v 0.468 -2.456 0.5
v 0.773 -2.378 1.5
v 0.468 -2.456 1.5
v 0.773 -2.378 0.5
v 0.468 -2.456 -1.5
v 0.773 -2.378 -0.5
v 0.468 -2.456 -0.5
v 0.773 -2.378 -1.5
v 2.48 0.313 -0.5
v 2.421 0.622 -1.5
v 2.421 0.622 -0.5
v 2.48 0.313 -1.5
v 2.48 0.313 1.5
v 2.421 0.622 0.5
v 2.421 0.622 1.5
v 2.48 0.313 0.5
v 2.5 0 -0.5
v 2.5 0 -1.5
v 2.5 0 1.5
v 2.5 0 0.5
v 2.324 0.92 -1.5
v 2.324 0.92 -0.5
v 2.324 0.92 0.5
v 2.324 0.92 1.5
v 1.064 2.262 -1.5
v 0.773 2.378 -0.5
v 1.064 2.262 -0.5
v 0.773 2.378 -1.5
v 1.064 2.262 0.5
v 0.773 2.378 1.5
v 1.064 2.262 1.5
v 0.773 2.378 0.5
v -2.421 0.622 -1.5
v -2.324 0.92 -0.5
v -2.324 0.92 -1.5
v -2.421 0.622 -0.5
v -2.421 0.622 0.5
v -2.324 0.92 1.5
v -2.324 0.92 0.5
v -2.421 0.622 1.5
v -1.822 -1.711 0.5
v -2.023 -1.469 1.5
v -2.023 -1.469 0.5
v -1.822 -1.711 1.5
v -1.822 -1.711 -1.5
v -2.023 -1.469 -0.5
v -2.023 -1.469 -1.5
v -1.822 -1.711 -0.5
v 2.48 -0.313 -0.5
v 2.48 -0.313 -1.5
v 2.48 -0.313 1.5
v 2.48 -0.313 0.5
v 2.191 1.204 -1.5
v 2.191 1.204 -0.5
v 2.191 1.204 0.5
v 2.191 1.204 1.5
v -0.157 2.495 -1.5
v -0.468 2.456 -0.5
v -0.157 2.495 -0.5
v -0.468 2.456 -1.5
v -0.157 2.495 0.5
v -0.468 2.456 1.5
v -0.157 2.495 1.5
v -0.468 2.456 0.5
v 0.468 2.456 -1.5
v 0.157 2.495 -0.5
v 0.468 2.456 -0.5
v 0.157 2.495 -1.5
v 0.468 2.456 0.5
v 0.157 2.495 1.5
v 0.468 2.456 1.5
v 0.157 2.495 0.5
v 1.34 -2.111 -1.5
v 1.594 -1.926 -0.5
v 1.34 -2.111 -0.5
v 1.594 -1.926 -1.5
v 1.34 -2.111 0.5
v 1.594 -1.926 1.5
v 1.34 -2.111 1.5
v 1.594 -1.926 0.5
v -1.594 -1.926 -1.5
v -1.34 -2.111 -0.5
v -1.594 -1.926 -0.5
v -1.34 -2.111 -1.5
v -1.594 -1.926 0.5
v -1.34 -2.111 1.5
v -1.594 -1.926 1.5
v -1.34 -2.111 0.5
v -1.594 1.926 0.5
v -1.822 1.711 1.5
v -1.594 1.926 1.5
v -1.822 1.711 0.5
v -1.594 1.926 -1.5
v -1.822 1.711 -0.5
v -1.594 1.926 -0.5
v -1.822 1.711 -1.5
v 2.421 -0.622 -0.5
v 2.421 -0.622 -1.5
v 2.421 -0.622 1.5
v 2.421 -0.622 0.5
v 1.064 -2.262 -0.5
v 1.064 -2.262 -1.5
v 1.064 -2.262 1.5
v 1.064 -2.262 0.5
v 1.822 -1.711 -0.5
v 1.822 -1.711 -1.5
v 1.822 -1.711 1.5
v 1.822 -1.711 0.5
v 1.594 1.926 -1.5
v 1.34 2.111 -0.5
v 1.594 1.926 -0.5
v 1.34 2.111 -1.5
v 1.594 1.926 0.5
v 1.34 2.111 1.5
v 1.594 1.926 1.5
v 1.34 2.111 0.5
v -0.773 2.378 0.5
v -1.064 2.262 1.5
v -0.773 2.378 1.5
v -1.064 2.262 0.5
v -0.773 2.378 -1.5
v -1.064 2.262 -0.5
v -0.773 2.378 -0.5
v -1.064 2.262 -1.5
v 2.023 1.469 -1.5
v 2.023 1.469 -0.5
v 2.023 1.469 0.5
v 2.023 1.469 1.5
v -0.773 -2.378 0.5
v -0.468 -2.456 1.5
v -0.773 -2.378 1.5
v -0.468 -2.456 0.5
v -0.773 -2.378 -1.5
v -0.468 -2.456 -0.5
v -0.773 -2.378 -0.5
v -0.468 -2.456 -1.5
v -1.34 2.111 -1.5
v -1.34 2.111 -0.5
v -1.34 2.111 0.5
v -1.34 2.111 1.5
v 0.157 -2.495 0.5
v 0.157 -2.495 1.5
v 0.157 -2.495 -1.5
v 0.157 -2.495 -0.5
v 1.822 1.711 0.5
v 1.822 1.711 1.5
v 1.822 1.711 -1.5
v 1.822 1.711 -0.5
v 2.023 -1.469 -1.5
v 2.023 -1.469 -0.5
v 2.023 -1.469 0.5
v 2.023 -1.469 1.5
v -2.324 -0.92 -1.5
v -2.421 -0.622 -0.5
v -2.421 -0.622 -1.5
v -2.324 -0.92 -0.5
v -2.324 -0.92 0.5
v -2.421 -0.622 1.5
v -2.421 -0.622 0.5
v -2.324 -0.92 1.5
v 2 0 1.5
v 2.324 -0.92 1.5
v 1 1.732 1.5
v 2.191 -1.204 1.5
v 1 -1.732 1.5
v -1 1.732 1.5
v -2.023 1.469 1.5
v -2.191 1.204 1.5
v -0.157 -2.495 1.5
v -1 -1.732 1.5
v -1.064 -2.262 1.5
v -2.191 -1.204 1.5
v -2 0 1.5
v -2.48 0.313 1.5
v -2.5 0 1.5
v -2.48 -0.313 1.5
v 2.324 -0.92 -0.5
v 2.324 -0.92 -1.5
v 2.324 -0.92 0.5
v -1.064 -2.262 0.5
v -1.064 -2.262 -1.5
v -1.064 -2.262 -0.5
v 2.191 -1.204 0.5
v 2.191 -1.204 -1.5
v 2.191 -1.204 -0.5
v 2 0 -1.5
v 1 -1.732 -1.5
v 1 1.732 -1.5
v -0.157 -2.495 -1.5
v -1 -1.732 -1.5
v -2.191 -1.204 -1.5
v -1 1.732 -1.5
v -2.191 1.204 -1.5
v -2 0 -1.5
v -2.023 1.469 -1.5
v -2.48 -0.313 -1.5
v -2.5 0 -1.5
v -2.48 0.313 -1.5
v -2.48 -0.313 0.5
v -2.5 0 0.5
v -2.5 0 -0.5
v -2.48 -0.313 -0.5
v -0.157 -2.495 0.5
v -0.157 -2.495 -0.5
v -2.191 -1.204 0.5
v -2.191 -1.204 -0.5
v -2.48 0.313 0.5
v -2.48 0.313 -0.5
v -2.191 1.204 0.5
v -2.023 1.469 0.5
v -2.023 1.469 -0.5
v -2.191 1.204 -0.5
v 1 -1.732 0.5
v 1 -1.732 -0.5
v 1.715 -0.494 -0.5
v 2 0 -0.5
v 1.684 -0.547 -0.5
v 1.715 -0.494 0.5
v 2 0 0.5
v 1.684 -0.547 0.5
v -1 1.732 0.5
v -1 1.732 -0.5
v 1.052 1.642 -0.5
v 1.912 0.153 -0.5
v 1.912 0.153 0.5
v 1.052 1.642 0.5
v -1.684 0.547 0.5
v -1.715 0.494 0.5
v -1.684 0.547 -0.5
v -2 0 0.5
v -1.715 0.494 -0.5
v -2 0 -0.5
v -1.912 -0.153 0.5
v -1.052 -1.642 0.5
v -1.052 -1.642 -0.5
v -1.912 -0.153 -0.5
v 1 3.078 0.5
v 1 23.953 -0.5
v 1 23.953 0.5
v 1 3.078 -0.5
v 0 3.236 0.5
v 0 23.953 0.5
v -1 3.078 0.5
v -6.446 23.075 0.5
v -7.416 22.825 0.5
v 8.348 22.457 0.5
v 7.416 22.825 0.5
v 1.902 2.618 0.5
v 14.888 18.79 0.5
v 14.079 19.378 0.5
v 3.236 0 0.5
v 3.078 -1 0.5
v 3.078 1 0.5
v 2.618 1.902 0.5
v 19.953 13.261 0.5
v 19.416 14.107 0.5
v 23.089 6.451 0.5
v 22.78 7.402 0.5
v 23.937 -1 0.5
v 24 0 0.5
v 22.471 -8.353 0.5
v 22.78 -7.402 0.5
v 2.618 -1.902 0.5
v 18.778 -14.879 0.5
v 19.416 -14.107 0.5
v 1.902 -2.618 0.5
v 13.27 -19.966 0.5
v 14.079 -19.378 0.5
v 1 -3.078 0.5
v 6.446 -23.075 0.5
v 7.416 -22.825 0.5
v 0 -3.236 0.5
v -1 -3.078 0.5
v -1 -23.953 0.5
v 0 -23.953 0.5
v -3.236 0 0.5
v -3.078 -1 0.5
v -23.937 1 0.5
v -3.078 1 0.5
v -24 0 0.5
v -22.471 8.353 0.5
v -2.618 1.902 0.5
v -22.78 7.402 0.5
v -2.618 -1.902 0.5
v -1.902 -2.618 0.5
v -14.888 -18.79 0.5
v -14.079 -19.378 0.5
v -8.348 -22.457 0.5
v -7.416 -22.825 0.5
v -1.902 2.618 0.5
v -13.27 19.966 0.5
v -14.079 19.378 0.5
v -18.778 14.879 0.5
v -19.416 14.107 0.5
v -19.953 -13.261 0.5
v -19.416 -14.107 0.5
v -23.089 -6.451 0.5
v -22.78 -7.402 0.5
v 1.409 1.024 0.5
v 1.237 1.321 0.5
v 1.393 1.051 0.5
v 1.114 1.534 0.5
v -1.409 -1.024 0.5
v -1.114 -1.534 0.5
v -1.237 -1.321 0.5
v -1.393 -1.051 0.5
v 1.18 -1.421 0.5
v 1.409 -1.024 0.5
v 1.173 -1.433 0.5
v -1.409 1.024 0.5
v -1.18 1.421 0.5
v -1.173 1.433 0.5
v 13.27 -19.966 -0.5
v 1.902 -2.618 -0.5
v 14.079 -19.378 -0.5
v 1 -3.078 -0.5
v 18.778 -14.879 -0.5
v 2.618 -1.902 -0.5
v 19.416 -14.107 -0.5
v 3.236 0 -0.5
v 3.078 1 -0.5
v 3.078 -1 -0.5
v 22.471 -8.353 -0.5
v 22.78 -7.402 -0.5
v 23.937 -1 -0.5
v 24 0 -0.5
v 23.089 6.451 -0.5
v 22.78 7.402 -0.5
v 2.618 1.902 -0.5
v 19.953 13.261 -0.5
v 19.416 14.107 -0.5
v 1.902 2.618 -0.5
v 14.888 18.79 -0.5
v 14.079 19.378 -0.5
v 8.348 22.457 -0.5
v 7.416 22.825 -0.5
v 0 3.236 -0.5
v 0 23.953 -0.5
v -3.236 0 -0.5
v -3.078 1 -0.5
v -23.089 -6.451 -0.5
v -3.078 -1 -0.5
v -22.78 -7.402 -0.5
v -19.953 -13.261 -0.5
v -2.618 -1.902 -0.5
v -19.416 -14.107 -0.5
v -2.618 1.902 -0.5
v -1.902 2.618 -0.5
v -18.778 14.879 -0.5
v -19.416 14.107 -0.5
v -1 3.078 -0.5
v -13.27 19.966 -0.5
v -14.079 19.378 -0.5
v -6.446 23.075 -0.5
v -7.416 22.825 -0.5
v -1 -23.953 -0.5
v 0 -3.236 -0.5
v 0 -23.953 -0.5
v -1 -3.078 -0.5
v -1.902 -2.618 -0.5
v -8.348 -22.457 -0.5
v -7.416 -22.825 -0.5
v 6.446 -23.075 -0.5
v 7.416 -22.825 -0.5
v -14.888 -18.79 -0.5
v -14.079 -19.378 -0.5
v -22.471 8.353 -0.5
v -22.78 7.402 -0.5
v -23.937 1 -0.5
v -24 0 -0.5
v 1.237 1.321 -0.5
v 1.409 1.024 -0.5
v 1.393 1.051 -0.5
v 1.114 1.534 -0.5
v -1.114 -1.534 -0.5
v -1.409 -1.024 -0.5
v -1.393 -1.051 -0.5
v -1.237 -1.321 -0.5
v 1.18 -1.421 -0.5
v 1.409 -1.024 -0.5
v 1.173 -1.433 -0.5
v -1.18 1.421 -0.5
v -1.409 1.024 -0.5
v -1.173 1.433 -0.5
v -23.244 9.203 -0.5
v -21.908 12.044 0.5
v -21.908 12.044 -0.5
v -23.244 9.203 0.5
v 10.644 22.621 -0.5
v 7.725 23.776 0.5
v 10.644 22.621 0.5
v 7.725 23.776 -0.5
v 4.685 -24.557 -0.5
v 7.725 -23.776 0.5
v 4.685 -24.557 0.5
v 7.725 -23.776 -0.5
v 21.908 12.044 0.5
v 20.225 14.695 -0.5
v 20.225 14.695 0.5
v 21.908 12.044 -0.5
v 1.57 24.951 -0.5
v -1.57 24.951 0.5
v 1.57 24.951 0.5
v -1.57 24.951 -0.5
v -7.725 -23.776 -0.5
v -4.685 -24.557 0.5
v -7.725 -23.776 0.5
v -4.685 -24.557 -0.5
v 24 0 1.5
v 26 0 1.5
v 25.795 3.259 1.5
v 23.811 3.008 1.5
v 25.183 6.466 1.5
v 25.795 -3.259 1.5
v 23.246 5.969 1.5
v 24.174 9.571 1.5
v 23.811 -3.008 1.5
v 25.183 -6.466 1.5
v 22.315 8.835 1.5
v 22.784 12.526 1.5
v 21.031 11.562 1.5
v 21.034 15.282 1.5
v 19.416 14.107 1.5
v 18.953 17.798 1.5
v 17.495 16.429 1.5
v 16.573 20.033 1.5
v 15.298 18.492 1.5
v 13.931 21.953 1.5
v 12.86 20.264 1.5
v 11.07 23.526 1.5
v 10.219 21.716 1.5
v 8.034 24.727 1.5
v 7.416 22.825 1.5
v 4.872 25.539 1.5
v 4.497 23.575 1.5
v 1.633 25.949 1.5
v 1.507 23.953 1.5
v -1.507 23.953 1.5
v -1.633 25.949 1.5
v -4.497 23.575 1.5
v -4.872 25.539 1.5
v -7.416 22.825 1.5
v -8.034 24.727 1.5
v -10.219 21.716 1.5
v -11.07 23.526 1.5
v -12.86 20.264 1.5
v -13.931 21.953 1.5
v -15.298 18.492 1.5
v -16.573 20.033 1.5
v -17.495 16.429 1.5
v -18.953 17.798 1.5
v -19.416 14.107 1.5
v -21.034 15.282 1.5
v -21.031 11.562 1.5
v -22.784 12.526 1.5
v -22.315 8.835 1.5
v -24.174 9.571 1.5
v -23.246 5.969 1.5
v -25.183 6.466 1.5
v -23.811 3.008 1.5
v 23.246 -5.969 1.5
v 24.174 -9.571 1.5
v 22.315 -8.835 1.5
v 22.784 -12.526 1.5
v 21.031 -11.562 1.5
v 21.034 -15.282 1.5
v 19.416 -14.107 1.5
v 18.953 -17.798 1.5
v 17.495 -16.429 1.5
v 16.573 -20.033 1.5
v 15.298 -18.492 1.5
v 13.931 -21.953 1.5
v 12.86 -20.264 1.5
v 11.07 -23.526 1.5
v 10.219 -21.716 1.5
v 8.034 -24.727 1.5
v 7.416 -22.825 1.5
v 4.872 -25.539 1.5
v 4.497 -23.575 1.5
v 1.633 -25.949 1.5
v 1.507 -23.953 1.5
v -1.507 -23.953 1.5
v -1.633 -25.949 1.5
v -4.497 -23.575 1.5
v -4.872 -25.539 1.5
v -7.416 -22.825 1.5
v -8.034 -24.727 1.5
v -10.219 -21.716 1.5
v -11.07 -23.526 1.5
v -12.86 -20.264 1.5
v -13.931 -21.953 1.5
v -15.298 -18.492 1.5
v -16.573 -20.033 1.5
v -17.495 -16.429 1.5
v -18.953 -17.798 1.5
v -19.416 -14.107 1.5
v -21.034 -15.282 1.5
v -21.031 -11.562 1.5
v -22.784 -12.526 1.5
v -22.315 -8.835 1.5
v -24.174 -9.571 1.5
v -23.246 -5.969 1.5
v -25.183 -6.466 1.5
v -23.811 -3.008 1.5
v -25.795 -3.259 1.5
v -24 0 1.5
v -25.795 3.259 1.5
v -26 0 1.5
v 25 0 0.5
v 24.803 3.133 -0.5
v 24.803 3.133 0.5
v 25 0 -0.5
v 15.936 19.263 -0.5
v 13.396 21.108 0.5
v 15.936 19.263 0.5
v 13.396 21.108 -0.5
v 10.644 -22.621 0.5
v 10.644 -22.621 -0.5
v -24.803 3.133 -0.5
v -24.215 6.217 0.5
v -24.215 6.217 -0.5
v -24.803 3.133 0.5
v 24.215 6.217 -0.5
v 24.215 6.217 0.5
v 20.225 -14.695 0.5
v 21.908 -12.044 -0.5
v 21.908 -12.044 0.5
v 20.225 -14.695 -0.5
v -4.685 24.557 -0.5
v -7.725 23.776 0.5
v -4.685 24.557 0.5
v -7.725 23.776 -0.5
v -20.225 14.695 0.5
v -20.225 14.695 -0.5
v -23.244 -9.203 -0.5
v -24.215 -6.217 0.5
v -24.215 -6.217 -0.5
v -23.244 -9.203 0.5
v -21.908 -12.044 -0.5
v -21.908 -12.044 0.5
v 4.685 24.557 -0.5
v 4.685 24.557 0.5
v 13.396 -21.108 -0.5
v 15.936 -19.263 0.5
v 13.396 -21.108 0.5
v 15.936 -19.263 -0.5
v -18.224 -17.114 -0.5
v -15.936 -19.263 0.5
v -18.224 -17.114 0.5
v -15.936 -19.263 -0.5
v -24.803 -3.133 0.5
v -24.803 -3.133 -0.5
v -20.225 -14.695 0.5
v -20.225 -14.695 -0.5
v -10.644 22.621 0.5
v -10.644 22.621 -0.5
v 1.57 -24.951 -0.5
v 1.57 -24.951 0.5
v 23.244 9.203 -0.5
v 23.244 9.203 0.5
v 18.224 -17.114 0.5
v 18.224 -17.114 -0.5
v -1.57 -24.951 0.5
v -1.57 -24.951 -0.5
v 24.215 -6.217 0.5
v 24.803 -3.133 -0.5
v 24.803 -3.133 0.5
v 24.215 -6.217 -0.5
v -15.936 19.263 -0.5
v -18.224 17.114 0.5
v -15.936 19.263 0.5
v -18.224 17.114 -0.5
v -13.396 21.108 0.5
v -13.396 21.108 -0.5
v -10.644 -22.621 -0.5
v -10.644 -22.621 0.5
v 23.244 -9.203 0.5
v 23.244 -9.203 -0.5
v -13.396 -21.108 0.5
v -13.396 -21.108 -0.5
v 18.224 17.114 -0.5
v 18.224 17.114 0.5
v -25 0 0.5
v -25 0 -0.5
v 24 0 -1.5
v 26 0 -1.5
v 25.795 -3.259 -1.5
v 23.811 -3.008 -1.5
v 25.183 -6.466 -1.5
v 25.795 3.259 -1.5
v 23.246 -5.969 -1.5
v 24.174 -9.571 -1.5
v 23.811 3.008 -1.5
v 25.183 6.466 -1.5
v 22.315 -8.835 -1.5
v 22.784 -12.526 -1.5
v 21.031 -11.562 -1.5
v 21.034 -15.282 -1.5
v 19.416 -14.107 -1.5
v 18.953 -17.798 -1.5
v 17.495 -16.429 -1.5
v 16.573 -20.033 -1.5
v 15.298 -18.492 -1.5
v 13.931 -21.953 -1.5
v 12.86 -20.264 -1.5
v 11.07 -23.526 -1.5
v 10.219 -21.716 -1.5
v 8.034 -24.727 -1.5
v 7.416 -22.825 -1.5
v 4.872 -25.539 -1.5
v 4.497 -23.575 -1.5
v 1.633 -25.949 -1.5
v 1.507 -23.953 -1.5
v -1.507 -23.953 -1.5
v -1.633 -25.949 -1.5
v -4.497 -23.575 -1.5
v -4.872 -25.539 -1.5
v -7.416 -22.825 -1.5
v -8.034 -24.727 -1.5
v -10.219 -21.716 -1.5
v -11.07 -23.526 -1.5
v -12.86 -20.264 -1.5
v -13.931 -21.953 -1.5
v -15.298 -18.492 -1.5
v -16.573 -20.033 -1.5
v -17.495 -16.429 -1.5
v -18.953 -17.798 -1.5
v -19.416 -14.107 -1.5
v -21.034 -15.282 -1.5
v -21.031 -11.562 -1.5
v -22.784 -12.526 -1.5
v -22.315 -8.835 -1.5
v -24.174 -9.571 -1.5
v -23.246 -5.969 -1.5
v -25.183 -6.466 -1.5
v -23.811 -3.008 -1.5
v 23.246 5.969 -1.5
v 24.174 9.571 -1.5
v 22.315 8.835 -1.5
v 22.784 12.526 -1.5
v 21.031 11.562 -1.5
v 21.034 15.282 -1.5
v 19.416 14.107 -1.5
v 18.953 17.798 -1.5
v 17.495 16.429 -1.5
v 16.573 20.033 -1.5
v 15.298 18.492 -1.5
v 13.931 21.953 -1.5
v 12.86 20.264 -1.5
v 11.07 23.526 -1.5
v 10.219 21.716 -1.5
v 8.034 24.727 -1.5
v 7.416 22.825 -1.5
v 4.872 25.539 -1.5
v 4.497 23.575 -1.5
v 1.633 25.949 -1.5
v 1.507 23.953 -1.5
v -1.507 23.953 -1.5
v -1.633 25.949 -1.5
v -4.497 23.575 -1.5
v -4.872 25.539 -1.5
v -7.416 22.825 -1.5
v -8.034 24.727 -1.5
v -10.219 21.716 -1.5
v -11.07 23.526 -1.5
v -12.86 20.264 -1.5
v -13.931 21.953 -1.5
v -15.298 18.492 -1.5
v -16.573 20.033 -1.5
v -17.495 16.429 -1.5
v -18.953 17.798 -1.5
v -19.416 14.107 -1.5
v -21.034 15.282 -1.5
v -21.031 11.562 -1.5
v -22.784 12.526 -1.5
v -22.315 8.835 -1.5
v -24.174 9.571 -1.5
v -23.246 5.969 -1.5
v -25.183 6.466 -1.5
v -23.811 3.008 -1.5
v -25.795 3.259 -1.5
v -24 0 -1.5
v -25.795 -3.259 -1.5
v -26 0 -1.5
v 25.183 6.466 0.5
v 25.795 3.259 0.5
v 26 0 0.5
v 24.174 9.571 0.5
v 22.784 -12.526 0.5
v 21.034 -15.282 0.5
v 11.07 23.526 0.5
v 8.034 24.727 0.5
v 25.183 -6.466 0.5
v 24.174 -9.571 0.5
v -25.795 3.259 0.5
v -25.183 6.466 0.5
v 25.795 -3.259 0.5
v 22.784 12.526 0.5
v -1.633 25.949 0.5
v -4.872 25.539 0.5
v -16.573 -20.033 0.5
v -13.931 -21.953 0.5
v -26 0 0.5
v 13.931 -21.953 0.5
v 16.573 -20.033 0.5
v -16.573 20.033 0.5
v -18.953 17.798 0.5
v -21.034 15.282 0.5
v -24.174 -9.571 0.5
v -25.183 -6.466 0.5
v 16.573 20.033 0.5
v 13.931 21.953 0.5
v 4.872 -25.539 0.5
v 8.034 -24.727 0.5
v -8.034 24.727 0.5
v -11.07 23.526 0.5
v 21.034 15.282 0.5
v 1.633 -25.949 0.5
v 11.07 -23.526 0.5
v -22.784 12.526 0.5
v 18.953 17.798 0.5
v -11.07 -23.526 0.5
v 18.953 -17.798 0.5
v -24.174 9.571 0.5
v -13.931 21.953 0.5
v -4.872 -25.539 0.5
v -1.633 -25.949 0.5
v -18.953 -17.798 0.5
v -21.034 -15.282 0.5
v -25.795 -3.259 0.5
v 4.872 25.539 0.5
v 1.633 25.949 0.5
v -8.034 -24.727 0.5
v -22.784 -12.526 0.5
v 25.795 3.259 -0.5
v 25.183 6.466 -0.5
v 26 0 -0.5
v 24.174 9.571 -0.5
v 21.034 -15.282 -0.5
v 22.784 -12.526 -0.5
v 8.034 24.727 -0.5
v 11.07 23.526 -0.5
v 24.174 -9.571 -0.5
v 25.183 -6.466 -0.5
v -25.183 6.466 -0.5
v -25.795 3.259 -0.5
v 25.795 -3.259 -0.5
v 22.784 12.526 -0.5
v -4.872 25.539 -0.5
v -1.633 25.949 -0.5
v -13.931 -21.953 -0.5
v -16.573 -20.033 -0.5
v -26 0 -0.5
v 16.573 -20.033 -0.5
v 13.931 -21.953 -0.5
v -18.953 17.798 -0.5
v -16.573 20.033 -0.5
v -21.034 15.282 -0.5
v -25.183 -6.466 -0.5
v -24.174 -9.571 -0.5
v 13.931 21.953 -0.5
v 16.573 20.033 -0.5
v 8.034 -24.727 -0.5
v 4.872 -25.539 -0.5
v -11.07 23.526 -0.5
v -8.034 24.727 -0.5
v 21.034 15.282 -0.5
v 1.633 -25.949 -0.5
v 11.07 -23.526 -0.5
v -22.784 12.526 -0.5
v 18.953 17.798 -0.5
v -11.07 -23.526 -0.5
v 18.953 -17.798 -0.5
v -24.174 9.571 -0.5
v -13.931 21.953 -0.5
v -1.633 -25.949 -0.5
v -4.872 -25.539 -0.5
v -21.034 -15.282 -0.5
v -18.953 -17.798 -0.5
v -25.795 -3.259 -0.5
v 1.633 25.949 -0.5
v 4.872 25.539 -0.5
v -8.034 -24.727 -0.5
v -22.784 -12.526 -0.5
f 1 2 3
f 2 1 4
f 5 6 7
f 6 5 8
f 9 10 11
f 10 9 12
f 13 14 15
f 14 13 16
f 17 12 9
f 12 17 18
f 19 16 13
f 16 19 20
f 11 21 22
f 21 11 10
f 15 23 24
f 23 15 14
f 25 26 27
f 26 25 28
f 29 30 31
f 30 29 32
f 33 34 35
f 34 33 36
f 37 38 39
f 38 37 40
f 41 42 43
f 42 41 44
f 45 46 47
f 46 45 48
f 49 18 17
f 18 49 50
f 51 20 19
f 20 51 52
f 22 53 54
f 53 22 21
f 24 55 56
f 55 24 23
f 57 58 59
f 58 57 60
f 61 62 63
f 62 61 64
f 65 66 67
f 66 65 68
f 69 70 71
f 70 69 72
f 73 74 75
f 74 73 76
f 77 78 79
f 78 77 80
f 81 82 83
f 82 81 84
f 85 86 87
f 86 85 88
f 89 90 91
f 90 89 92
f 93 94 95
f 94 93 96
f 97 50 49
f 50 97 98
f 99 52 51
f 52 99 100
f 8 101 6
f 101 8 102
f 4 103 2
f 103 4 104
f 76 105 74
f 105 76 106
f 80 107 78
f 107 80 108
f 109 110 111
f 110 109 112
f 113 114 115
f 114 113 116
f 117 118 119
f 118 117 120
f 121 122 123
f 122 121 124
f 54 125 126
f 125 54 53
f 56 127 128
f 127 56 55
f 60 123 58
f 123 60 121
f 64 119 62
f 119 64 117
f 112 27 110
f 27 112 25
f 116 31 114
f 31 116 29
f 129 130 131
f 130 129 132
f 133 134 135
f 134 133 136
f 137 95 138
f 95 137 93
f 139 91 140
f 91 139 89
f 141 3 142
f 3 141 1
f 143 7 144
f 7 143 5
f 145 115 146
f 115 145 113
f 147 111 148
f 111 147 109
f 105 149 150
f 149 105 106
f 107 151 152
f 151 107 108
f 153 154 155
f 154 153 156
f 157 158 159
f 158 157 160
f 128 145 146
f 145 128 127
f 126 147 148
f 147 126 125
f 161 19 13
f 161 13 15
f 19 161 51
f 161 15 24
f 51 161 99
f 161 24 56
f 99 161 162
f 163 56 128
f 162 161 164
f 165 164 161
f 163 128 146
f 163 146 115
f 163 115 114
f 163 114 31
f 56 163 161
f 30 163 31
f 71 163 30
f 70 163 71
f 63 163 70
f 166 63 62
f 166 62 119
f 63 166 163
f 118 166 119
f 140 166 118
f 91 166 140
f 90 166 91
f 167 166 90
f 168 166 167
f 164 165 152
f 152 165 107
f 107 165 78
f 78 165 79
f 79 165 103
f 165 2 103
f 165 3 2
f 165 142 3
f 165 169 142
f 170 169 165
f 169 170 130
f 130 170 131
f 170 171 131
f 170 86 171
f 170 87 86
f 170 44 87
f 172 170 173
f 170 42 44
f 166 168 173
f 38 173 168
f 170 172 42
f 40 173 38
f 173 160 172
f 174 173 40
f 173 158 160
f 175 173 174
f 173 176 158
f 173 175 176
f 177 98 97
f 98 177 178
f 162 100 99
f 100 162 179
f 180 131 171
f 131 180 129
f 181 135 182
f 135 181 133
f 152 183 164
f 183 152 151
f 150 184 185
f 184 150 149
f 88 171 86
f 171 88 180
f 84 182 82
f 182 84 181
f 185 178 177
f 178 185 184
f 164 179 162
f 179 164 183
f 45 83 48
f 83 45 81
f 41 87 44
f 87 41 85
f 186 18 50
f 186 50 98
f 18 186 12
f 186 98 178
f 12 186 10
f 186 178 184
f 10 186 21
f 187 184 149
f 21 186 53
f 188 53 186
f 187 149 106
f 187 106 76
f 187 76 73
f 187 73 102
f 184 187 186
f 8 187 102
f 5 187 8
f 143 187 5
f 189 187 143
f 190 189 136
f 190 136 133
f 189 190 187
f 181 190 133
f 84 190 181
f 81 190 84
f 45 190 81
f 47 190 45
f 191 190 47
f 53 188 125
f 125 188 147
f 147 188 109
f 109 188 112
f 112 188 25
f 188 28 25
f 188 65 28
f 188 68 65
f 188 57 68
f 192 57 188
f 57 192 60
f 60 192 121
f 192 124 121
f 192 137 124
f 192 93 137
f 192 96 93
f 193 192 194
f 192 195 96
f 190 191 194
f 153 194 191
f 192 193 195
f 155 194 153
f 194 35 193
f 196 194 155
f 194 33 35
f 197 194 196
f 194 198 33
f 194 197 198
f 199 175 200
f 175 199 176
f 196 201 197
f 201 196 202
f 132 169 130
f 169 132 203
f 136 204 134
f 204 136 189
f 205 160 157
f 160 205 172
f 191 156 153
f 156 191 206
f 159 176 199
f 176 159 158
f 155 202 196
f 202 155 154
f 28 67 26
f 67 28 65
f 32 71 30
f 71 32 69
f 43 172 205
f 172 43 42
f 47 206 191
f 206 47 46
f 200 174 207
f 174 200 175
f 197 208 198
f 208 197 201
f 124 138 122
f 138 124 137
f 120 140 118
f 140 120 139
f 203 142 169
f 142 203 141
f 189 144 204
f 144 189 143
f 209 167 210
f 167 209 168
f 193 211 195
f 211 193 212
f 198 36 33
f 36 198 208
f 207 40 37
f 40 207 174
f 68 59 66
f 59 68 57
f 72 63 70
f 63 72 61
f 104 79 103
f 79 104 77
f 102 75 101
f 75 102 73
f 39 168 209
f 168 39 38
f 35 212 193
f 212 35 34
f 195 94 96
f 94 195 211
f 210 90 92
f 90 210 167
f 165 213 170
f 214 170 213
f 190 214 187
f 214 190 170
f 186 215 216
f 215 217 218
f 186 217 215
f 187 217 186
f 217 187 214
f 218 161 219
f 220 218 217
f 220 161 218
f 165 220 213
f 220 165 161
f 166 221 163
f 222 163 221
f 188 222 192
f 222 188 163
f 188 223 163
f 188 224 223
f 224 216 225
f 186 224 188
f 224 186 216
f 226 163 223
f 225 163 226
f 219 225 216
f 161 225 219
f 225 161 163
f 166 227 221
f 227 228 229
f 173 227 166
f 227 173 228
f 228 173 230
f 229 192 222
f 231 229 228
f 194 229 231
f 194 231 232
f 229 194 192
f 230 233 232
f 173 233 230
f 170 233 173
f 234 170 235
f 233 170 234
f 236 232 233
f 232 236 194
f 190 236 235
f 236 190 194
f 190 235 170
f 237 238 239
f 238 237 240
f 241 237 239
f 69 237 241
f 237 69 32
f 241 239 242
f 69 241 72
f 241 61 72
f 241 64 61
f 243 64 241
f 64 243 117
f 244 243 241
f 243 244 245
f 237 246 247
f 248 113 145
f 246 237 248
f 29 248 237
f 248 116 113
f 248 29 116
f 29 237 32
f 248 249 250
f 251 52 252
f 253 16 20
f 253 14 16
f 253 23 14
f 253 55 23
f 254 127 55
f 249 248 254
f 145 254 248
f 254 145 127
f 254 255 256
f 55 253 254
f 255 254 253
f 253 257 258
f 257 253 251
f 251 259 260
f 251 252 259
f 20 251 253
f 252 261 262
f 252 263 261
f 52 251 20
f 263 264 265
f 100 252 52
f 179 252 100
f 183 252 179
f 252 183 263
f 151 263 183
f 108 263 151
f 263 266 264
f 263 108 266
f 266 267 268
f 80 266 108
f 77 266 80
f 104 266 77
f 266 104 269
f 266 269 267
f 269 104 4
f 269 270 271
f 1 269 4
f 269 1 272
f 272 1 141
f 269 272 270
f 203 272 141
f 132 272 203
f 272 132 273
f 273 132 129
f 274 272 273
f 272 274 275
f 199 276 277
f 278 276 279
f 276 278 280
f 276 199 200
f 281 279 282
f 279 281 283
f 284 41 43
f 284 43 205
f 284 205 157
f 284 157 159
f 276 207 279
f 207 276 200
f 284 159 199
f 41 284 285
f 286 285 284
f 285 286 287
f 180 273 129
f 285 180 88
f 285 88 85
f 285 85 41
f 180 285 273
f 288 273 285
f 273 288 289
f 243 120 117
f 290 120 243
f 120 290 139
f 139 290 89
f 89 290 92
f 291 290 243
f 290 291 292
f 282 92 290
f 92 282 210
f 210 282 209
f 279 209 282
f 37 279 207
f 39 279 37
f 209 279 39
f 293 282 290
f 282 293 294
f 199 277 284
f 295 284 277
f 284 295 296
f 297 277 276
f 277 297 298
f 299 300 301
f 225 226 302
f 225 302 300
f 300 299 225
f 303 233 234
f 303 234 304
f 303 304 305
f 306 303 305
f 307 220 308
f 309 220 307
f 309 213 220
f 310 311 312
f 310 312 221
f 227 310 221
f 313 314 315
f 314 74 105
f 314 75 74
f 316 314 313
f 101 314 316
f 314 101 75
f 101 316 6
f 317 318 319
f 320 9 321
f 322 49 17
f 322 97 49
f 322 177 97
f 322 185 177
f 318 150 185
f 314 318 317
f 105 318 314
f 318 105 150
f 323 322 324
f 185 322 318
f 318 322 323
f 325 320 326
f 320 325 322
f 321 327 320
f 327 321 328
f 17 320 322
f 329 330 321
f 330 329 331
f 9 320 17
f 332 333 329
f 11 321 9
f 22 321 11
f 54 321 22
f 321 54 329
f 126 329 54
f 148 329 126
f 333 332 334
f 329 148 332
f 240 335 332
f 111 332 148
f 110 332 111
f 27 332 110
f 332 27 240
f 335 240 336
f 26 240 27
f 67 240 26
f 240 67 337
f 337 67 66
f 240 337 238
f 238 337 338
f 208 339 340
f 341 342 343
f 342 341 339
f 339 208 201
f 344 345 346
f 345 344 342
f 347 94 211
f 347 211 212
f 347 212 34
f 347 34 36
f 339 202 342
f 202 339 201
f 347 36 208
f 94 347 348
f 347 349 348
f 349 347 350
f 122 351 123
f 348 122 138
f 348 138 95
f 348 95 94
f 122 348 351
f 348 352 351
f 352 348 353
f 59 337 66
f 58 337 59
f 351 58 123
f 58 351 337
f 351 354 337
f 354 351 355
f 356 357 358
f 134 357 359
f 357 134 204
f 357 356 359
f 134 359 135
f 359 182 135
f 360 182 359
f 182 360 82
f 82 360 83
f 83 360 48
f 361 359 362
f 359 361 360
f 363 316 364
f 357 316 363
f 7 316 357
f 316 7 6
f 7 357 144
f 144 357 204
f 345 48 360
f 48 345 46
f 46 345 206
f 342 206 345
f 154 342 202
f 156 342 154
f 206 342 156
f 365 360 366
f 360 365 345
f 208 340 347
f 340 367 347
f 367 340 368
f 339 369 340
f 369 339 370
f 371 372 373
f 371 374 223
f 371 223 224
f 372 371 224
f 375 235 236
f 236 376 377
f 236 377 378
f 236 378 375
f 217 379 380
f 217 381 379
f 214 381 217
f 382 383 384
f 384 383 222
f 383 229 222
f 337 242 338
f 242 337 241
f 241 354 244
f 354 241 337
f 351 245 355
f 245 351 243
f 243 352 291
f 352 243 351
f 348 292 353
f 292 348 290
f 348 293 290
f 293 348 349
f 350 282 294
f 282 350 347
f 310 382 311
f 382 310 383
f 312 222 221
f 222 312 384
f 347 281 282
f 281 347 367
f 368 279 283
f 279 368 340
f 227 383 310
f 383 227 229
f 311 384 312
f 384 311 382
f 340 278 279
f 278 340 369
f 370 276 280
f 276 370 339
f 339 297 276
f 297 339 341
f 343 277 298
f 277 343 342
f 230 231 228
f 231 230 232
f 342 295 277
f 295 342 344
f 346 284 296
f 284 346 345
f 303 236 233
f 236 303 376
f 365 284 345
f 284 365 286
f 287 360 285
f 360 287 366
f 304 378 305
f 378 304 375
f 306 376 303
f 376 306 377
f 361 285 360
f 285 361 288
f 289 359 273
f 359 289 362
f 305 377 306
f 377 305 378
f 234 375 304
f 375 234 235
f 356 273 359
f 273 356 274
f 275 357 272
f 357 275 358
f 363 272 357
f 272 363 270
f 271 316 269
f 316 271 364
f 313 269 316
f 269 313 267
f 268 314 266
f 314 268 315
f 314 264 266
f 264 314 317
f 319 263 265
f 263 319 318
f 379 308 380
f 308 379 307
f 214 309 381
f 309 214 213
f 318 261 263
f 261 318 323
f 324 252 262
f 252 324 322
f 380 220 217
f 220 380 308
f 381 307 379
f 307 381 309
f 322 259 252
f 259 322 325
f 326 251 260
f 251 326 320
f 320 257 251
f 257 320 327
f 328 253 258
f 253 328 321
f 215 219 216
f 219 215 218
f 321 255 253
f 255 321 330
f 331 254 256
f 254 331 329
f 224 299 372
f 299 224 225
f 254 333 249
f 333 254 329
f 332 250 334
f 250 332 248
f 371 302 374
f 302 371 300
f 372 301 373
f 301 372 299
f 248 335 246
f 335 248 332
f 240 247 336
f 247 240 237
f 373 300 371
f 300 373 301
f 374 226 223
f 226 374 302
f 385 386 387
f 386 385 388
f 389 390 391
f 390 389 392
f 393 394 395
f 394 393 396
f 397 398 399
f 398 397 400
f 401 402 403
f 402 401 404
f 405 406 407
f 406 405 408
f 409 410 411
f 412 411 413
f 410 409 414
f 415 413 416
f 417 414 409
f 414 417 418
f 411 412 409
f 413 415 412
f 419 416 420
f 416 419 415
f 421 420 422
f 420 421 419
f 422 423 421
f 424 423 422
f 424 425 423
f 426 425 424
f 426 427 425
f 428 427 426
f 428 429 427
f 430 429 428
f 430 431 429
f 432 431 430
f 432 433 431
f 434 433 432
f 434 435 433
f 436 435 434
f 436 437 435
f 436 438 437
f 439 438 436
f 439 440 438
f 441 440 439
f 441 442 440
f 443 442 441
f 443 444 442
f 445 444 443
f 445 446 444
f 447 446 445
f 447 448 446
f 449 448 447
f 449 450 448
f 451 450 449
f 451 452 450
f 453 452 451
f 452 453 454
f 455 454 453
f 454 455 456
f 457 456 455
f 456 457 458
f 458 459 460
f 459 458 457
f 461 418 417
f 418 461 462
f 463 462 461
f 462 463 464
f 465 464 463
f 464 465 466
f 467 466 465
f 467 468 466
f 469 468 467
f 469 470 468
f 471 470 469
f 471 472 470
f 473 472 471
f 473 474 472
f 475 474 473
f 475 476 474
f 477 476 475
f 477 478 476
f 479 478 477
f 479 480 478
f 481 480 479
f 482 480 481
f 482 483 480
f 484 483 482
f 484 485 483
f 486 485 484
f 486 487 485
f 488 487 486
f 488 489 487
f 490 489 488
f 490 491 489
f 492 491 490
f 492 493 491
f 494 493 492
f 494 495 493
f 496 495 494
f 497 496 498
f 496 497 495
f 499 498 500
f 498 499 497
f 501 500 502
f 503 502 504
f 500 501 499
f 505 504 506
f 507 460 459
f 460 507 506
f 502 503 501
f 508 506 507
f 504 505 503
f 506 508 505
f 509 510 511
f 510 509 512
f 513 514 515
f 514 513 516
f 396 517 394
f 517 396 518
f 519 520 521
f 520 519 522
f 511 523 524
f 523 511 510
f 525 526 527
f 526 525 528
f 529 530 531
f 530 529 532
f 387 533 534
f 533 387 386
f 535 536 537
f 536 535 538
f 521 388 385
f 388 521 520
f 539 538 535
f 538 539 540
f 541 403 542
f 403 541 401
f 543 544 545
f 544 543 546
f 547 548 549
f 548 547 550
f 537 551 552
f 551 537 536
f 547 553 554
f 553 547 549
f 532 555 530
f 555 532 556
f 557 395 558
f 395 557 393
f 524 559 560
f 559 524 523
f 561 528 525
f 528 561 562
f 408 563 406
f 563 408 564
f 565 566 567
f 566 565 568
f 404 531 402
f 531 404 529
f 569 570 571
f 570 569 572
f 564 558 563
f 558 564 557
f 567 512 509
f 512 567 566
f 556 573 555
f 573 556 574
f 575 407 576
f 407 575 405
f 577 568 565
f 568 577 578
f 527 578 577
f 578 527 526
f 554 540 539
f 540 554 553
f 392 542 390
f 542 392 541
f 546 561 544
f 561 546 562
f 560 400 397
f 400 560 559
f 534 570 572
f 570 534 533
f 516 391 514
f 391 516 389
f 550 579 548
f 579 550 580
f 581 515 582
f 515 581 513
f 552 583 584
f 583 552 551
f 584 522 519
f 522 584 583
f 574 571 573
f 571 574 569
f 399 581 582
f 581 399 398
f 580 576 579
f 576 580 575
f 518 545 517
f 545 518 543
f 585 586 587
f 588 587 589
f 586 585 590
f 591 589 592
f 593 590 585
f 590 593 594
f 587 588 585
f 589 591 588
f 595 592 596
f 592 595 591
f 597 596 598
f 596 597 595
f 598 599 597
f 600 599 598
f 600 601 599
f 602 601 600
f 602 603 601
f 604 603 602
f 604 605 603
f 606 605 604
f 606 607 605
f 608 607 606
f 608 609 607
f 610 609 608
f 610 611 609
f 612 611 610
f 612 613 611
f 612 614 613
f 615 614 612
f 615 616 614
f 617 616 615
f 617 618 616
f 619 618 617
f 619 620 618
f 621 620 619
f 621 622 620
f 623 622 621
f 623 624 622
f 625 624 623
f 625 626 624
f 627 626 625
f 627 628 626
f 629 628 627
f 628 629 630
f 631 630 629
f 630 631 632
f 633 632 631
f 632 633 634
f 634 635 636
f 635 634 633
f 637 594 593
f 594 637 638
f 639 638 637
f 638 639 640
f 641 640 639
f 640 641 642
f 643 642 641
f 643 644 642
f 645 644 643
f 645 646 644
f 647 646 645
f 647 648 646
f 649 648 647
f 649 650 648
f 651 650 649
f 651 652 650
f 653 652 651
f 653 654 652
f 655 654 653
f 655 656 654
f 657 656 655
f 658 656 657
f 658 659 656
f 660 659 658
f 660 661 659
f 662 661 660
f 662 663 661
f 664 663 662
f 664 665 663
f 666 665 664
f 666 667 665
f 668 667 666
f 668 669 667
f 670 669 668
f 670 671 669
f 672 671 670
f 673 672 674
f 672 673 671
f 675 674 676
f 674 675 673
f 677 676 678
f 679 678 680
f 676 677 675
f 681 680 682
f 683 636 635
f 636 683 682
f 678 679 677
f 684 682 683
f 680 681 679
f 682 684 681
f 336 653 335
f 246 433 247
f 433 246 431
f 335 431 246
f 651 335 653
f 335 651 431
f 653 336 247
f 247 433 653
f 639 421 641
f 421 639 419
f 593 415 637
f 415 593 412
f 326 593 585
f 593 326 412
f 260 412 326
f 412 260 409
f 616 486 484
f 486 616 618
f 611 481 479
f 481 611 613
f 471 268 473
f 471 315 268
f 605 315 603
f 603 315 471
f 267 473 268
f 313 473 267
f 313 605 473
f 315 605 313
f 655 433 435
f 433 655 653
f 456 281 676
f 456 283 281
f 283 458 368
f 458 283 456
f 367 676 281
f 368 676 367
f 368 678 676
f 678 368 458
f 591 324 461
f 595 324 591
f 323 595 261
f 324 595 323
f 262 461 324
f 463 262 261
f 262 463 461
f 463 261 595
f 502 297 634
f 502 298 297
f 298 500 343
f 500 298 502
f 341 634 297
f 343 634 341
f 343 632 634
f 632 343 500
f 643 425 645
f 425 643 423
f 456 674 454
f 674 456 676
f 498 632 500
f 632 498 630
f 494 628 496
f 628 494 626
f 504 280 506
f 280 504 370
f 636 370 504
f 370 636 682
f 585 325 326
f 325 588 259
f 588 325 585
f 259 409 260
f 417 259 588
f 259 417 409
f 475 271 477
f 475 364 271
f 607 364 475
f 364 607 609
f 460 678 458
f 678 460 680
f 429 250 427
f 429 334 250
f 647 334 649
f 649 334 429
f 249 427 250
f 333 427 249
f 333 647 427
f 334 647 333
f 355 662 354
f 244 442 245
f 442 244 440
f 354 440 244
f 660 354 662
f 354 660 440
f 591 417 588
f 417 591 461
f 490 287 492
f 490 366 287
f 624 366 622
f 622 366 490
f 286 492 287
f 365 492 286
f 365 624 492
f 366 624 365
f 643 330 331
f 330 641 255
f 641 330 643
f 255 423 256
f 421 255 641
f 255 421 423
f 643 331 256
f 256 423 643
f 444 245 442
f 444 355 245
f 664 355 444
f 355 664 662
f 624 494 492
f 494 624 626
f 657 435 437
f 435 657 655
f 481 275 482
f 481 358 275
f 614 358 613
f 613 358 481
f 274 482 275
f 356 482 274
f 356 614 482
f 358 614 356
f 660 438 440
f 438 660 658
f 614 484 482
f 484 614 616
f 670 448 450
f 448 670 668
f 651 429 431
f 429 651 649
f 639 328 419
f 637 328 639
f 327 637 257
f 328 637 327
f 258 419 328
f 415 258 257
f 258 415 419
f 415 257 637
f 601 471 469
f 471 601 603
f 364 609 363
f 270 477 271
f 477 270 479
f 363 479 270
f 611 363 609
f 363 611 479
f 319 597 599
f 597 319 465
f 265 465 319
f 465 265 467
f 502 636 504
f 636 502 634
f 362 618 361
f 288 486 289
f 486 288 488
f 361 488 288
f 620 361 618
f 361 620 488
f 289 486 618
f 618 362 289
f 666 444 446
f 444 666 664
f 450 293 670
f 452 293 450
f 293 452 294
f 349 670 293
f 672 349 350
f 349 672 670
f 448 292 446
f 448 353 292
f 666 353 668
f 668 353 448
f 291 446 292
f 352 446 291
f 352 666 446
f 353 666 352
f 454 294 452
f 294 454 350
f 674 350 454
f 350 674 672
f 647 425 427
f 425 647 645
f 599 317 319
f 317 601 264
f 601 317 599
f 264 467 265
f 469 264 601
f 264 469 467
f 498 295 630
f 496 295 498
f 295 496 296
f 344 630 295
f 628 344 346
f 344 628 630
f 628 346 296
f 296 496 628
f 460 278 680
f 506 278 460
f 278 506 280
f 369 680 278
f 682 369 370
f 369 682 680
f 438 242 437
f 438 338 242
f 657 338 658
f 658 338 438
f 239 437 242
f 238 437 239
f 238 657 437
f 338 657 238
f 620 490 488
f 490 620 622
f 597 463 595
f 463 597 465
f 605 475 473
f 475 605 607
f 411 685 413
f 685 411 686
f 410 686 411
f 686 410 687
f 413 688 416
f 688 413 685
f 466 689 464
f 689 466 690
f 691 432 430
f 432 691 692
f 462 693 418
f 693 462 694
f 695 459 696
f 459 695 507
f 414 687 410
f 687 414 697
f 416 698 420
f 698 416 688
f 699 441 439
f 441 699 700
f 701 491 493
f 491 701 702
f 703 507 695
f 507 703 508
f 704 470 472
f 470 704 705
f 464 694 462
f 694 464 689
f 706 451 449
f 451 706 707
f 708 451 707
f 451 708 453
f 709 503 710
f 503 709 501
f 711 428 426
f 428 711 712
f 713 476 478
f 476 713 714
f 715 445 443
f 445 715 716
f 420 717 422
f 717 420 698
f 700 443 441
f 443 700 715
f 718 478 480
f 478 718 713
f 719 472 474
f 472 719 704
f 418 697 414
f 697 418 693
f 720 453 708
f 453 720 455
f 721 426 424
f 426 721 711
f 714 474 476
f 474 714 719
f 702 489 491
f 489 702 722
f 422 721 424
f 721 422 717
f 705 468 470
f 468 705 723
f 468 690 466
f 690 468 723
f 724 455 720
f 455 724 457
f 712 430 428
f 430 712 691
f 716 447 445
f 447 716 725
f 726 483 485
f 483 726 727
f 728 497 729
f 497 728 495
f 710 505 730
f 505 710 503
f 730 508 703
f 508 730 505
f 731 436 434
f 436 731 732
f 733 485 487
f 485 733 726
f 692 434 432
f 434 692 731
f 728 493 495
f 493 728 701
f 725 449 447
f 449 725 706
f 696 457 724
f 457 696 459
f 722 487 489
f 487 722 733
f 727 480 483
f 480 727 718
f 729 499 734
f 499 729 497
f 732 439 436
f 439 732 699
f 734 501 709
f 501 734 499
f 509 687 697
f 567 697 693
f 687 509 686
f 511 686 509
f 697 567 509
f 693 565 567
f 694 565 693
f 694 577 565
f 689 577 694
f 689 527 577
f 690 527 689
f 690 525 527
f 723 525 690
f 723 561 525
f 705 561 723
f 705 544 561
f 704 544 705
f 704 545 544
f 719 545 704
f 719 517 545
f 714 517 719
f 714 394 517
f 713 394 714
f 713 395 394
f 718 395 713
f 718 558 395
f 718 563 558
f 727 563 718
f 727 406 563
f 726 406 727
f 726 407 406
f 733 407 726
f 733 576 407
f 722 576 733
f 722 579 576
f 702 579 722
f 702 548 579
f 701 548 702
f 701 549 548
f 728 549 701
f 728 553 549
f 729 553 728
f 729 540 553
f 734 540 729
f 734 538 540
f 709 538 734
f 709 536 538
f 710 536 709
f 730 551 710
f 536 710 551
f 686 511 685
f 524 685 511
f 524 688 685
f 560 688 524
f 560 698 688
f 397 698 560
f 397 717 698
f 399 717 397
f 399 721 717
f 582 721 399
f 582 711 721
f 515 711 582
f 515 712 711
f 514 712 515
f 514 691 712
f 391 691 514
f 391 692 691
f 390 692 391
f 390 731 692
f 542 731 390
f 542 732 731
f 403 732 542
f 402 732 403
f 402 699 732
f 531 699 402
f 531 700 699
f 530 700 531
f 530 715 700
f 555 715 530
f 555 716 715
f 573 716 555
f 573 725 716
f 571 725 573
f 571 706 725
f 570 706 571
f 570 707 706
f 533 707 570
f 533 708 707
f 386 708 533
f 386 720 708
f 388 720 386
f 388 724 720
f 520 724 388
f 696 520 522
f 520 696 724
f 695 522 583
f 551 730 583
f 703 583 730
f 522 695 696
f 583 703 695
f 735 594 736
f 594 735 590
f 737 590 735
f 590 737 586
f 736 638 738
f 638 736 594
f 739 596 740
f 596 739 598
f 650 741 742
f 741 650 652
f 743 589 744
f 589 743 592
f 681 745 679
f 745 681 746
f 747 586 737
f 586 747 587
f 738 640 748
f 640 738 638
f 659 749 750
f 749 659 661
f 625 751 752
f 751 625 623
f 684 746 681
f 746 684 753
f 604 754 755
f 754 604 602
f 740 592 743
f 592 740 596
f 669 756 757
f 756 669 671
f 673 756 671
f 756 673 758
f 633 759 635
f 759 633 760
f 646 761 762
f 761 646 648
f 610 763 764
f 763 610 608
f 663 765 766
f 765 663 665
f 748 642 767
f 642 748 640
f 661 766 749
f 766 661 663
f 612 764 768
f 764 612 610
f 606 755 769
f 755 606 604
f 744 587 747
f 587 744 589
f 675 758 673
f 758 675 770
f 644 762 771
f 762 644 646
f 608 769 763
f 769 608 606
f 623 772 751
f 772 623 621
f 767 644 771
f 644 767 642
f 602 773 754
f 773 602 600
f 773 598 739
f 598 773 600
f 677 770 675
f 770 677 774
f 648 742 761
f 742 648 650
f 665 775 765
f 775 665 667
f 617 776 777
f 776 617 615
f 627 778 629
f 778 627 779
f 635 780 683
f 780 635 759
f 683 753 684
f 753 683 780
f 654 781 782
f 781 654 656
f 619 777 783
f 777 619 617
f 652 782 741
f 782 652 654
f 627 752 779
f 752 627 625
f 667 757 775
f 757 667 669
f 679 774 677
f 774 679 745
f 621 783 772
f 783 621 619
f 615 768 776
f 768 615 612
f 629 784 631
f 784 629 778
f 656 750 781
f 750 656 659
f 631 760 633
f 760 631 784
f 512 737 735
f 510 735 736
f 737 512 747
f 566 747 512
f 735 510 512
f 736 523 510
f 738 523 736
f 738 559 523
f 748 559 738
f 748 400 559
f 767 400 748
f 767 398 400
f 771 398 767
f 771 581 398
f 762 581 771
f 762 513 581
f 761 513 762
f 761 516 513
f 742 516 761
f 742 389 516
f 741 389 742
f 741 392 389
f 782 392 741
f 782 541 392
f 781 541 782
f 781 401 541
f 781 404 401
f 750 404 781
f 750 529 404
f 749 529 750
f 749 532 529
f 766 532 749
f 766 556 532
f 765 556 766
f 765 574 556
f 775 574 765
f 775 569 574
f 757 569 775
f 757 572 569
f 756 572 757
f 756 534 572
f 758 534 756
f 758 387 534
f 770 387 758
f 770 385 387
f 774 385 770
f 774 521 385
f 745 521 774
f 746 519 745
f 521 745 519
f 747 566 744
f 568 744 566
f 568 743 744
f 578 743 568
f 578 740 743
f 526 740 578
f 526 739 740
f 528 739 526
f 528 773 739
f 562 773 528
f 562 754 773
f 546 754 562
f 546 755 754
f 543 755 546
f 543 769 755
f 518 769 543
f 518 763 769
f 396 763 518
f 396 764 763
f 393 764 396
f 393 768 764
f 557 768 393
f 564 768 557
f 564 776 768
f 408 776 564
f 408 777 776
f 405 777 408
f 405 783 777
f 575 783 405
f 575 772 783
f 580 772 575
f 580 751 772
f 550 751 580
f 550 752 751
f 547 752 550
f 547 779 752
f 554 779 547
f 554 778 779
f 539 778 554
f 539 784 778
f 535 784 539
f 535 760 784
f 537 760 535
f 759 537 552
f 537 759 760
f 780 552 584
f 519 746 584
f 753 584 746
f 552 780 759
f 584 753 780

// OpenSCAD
//How Many Spokes Should There Be?
m=20; //[4:50]
//How Large Should The Center Hole Be?
h=2; //[1:12]
//How Many Sides Should The Center Hole Have?
c=6; //[3:12]
//How Large Are The Spokes?
a=1; //[1:8]
//What Is The radius Of The Wheel?
text_box=25;
//What Is The Height Of the Wheel?
l=3; //[3:20]
//Is There A Rim On The End?
rim="yes"; //[yes,no]
//How Much Lager Is The Toltal Rim Diameter? (Only Applys If There Is A Rim)
rd=1; //[1:5]

s=360/m;
difference() {
    cylinder(h=l,r=h+.5,$fn=50,center=true);
    cylinder(h=l+1,r=h,$fn=c,center=true);
}
for(r=[0:s:360]) {
    translate([0,0,0-a/2]) {
        rotate([0,0,r]) {
            difference() {
                cube([a,text_box-.5,a]);
                rotate([0,0,0-r]) {
                    cylinder(h=l+1,r=h,$fn=c,center=true);
                }
            }
        }
    }
}
difference() {
    cylinder(h=l,r=text_box, $fn=50,center=true);
    cylinder(h=l+1,r=text_box-1, $fn=50,center=true);
}
if(rim=="yes") {
    translate([0,0,l/3]) {
        difference() {
            cylinder(h=l/3,r=rd+text_box, $fn=50,center=true);
            cylinder(h=l+1,r=text_box-1, $fn=50,center=true);
        }
    }
    translate([0,0,0-l/3]) {
        difference() {
            cylinder(h=l/3,r=rd+text_box, $fn=50,center=true);
            cylinder(h=l+1,r=text_box-1, $fn=50,center=true);
        }
    }
}
